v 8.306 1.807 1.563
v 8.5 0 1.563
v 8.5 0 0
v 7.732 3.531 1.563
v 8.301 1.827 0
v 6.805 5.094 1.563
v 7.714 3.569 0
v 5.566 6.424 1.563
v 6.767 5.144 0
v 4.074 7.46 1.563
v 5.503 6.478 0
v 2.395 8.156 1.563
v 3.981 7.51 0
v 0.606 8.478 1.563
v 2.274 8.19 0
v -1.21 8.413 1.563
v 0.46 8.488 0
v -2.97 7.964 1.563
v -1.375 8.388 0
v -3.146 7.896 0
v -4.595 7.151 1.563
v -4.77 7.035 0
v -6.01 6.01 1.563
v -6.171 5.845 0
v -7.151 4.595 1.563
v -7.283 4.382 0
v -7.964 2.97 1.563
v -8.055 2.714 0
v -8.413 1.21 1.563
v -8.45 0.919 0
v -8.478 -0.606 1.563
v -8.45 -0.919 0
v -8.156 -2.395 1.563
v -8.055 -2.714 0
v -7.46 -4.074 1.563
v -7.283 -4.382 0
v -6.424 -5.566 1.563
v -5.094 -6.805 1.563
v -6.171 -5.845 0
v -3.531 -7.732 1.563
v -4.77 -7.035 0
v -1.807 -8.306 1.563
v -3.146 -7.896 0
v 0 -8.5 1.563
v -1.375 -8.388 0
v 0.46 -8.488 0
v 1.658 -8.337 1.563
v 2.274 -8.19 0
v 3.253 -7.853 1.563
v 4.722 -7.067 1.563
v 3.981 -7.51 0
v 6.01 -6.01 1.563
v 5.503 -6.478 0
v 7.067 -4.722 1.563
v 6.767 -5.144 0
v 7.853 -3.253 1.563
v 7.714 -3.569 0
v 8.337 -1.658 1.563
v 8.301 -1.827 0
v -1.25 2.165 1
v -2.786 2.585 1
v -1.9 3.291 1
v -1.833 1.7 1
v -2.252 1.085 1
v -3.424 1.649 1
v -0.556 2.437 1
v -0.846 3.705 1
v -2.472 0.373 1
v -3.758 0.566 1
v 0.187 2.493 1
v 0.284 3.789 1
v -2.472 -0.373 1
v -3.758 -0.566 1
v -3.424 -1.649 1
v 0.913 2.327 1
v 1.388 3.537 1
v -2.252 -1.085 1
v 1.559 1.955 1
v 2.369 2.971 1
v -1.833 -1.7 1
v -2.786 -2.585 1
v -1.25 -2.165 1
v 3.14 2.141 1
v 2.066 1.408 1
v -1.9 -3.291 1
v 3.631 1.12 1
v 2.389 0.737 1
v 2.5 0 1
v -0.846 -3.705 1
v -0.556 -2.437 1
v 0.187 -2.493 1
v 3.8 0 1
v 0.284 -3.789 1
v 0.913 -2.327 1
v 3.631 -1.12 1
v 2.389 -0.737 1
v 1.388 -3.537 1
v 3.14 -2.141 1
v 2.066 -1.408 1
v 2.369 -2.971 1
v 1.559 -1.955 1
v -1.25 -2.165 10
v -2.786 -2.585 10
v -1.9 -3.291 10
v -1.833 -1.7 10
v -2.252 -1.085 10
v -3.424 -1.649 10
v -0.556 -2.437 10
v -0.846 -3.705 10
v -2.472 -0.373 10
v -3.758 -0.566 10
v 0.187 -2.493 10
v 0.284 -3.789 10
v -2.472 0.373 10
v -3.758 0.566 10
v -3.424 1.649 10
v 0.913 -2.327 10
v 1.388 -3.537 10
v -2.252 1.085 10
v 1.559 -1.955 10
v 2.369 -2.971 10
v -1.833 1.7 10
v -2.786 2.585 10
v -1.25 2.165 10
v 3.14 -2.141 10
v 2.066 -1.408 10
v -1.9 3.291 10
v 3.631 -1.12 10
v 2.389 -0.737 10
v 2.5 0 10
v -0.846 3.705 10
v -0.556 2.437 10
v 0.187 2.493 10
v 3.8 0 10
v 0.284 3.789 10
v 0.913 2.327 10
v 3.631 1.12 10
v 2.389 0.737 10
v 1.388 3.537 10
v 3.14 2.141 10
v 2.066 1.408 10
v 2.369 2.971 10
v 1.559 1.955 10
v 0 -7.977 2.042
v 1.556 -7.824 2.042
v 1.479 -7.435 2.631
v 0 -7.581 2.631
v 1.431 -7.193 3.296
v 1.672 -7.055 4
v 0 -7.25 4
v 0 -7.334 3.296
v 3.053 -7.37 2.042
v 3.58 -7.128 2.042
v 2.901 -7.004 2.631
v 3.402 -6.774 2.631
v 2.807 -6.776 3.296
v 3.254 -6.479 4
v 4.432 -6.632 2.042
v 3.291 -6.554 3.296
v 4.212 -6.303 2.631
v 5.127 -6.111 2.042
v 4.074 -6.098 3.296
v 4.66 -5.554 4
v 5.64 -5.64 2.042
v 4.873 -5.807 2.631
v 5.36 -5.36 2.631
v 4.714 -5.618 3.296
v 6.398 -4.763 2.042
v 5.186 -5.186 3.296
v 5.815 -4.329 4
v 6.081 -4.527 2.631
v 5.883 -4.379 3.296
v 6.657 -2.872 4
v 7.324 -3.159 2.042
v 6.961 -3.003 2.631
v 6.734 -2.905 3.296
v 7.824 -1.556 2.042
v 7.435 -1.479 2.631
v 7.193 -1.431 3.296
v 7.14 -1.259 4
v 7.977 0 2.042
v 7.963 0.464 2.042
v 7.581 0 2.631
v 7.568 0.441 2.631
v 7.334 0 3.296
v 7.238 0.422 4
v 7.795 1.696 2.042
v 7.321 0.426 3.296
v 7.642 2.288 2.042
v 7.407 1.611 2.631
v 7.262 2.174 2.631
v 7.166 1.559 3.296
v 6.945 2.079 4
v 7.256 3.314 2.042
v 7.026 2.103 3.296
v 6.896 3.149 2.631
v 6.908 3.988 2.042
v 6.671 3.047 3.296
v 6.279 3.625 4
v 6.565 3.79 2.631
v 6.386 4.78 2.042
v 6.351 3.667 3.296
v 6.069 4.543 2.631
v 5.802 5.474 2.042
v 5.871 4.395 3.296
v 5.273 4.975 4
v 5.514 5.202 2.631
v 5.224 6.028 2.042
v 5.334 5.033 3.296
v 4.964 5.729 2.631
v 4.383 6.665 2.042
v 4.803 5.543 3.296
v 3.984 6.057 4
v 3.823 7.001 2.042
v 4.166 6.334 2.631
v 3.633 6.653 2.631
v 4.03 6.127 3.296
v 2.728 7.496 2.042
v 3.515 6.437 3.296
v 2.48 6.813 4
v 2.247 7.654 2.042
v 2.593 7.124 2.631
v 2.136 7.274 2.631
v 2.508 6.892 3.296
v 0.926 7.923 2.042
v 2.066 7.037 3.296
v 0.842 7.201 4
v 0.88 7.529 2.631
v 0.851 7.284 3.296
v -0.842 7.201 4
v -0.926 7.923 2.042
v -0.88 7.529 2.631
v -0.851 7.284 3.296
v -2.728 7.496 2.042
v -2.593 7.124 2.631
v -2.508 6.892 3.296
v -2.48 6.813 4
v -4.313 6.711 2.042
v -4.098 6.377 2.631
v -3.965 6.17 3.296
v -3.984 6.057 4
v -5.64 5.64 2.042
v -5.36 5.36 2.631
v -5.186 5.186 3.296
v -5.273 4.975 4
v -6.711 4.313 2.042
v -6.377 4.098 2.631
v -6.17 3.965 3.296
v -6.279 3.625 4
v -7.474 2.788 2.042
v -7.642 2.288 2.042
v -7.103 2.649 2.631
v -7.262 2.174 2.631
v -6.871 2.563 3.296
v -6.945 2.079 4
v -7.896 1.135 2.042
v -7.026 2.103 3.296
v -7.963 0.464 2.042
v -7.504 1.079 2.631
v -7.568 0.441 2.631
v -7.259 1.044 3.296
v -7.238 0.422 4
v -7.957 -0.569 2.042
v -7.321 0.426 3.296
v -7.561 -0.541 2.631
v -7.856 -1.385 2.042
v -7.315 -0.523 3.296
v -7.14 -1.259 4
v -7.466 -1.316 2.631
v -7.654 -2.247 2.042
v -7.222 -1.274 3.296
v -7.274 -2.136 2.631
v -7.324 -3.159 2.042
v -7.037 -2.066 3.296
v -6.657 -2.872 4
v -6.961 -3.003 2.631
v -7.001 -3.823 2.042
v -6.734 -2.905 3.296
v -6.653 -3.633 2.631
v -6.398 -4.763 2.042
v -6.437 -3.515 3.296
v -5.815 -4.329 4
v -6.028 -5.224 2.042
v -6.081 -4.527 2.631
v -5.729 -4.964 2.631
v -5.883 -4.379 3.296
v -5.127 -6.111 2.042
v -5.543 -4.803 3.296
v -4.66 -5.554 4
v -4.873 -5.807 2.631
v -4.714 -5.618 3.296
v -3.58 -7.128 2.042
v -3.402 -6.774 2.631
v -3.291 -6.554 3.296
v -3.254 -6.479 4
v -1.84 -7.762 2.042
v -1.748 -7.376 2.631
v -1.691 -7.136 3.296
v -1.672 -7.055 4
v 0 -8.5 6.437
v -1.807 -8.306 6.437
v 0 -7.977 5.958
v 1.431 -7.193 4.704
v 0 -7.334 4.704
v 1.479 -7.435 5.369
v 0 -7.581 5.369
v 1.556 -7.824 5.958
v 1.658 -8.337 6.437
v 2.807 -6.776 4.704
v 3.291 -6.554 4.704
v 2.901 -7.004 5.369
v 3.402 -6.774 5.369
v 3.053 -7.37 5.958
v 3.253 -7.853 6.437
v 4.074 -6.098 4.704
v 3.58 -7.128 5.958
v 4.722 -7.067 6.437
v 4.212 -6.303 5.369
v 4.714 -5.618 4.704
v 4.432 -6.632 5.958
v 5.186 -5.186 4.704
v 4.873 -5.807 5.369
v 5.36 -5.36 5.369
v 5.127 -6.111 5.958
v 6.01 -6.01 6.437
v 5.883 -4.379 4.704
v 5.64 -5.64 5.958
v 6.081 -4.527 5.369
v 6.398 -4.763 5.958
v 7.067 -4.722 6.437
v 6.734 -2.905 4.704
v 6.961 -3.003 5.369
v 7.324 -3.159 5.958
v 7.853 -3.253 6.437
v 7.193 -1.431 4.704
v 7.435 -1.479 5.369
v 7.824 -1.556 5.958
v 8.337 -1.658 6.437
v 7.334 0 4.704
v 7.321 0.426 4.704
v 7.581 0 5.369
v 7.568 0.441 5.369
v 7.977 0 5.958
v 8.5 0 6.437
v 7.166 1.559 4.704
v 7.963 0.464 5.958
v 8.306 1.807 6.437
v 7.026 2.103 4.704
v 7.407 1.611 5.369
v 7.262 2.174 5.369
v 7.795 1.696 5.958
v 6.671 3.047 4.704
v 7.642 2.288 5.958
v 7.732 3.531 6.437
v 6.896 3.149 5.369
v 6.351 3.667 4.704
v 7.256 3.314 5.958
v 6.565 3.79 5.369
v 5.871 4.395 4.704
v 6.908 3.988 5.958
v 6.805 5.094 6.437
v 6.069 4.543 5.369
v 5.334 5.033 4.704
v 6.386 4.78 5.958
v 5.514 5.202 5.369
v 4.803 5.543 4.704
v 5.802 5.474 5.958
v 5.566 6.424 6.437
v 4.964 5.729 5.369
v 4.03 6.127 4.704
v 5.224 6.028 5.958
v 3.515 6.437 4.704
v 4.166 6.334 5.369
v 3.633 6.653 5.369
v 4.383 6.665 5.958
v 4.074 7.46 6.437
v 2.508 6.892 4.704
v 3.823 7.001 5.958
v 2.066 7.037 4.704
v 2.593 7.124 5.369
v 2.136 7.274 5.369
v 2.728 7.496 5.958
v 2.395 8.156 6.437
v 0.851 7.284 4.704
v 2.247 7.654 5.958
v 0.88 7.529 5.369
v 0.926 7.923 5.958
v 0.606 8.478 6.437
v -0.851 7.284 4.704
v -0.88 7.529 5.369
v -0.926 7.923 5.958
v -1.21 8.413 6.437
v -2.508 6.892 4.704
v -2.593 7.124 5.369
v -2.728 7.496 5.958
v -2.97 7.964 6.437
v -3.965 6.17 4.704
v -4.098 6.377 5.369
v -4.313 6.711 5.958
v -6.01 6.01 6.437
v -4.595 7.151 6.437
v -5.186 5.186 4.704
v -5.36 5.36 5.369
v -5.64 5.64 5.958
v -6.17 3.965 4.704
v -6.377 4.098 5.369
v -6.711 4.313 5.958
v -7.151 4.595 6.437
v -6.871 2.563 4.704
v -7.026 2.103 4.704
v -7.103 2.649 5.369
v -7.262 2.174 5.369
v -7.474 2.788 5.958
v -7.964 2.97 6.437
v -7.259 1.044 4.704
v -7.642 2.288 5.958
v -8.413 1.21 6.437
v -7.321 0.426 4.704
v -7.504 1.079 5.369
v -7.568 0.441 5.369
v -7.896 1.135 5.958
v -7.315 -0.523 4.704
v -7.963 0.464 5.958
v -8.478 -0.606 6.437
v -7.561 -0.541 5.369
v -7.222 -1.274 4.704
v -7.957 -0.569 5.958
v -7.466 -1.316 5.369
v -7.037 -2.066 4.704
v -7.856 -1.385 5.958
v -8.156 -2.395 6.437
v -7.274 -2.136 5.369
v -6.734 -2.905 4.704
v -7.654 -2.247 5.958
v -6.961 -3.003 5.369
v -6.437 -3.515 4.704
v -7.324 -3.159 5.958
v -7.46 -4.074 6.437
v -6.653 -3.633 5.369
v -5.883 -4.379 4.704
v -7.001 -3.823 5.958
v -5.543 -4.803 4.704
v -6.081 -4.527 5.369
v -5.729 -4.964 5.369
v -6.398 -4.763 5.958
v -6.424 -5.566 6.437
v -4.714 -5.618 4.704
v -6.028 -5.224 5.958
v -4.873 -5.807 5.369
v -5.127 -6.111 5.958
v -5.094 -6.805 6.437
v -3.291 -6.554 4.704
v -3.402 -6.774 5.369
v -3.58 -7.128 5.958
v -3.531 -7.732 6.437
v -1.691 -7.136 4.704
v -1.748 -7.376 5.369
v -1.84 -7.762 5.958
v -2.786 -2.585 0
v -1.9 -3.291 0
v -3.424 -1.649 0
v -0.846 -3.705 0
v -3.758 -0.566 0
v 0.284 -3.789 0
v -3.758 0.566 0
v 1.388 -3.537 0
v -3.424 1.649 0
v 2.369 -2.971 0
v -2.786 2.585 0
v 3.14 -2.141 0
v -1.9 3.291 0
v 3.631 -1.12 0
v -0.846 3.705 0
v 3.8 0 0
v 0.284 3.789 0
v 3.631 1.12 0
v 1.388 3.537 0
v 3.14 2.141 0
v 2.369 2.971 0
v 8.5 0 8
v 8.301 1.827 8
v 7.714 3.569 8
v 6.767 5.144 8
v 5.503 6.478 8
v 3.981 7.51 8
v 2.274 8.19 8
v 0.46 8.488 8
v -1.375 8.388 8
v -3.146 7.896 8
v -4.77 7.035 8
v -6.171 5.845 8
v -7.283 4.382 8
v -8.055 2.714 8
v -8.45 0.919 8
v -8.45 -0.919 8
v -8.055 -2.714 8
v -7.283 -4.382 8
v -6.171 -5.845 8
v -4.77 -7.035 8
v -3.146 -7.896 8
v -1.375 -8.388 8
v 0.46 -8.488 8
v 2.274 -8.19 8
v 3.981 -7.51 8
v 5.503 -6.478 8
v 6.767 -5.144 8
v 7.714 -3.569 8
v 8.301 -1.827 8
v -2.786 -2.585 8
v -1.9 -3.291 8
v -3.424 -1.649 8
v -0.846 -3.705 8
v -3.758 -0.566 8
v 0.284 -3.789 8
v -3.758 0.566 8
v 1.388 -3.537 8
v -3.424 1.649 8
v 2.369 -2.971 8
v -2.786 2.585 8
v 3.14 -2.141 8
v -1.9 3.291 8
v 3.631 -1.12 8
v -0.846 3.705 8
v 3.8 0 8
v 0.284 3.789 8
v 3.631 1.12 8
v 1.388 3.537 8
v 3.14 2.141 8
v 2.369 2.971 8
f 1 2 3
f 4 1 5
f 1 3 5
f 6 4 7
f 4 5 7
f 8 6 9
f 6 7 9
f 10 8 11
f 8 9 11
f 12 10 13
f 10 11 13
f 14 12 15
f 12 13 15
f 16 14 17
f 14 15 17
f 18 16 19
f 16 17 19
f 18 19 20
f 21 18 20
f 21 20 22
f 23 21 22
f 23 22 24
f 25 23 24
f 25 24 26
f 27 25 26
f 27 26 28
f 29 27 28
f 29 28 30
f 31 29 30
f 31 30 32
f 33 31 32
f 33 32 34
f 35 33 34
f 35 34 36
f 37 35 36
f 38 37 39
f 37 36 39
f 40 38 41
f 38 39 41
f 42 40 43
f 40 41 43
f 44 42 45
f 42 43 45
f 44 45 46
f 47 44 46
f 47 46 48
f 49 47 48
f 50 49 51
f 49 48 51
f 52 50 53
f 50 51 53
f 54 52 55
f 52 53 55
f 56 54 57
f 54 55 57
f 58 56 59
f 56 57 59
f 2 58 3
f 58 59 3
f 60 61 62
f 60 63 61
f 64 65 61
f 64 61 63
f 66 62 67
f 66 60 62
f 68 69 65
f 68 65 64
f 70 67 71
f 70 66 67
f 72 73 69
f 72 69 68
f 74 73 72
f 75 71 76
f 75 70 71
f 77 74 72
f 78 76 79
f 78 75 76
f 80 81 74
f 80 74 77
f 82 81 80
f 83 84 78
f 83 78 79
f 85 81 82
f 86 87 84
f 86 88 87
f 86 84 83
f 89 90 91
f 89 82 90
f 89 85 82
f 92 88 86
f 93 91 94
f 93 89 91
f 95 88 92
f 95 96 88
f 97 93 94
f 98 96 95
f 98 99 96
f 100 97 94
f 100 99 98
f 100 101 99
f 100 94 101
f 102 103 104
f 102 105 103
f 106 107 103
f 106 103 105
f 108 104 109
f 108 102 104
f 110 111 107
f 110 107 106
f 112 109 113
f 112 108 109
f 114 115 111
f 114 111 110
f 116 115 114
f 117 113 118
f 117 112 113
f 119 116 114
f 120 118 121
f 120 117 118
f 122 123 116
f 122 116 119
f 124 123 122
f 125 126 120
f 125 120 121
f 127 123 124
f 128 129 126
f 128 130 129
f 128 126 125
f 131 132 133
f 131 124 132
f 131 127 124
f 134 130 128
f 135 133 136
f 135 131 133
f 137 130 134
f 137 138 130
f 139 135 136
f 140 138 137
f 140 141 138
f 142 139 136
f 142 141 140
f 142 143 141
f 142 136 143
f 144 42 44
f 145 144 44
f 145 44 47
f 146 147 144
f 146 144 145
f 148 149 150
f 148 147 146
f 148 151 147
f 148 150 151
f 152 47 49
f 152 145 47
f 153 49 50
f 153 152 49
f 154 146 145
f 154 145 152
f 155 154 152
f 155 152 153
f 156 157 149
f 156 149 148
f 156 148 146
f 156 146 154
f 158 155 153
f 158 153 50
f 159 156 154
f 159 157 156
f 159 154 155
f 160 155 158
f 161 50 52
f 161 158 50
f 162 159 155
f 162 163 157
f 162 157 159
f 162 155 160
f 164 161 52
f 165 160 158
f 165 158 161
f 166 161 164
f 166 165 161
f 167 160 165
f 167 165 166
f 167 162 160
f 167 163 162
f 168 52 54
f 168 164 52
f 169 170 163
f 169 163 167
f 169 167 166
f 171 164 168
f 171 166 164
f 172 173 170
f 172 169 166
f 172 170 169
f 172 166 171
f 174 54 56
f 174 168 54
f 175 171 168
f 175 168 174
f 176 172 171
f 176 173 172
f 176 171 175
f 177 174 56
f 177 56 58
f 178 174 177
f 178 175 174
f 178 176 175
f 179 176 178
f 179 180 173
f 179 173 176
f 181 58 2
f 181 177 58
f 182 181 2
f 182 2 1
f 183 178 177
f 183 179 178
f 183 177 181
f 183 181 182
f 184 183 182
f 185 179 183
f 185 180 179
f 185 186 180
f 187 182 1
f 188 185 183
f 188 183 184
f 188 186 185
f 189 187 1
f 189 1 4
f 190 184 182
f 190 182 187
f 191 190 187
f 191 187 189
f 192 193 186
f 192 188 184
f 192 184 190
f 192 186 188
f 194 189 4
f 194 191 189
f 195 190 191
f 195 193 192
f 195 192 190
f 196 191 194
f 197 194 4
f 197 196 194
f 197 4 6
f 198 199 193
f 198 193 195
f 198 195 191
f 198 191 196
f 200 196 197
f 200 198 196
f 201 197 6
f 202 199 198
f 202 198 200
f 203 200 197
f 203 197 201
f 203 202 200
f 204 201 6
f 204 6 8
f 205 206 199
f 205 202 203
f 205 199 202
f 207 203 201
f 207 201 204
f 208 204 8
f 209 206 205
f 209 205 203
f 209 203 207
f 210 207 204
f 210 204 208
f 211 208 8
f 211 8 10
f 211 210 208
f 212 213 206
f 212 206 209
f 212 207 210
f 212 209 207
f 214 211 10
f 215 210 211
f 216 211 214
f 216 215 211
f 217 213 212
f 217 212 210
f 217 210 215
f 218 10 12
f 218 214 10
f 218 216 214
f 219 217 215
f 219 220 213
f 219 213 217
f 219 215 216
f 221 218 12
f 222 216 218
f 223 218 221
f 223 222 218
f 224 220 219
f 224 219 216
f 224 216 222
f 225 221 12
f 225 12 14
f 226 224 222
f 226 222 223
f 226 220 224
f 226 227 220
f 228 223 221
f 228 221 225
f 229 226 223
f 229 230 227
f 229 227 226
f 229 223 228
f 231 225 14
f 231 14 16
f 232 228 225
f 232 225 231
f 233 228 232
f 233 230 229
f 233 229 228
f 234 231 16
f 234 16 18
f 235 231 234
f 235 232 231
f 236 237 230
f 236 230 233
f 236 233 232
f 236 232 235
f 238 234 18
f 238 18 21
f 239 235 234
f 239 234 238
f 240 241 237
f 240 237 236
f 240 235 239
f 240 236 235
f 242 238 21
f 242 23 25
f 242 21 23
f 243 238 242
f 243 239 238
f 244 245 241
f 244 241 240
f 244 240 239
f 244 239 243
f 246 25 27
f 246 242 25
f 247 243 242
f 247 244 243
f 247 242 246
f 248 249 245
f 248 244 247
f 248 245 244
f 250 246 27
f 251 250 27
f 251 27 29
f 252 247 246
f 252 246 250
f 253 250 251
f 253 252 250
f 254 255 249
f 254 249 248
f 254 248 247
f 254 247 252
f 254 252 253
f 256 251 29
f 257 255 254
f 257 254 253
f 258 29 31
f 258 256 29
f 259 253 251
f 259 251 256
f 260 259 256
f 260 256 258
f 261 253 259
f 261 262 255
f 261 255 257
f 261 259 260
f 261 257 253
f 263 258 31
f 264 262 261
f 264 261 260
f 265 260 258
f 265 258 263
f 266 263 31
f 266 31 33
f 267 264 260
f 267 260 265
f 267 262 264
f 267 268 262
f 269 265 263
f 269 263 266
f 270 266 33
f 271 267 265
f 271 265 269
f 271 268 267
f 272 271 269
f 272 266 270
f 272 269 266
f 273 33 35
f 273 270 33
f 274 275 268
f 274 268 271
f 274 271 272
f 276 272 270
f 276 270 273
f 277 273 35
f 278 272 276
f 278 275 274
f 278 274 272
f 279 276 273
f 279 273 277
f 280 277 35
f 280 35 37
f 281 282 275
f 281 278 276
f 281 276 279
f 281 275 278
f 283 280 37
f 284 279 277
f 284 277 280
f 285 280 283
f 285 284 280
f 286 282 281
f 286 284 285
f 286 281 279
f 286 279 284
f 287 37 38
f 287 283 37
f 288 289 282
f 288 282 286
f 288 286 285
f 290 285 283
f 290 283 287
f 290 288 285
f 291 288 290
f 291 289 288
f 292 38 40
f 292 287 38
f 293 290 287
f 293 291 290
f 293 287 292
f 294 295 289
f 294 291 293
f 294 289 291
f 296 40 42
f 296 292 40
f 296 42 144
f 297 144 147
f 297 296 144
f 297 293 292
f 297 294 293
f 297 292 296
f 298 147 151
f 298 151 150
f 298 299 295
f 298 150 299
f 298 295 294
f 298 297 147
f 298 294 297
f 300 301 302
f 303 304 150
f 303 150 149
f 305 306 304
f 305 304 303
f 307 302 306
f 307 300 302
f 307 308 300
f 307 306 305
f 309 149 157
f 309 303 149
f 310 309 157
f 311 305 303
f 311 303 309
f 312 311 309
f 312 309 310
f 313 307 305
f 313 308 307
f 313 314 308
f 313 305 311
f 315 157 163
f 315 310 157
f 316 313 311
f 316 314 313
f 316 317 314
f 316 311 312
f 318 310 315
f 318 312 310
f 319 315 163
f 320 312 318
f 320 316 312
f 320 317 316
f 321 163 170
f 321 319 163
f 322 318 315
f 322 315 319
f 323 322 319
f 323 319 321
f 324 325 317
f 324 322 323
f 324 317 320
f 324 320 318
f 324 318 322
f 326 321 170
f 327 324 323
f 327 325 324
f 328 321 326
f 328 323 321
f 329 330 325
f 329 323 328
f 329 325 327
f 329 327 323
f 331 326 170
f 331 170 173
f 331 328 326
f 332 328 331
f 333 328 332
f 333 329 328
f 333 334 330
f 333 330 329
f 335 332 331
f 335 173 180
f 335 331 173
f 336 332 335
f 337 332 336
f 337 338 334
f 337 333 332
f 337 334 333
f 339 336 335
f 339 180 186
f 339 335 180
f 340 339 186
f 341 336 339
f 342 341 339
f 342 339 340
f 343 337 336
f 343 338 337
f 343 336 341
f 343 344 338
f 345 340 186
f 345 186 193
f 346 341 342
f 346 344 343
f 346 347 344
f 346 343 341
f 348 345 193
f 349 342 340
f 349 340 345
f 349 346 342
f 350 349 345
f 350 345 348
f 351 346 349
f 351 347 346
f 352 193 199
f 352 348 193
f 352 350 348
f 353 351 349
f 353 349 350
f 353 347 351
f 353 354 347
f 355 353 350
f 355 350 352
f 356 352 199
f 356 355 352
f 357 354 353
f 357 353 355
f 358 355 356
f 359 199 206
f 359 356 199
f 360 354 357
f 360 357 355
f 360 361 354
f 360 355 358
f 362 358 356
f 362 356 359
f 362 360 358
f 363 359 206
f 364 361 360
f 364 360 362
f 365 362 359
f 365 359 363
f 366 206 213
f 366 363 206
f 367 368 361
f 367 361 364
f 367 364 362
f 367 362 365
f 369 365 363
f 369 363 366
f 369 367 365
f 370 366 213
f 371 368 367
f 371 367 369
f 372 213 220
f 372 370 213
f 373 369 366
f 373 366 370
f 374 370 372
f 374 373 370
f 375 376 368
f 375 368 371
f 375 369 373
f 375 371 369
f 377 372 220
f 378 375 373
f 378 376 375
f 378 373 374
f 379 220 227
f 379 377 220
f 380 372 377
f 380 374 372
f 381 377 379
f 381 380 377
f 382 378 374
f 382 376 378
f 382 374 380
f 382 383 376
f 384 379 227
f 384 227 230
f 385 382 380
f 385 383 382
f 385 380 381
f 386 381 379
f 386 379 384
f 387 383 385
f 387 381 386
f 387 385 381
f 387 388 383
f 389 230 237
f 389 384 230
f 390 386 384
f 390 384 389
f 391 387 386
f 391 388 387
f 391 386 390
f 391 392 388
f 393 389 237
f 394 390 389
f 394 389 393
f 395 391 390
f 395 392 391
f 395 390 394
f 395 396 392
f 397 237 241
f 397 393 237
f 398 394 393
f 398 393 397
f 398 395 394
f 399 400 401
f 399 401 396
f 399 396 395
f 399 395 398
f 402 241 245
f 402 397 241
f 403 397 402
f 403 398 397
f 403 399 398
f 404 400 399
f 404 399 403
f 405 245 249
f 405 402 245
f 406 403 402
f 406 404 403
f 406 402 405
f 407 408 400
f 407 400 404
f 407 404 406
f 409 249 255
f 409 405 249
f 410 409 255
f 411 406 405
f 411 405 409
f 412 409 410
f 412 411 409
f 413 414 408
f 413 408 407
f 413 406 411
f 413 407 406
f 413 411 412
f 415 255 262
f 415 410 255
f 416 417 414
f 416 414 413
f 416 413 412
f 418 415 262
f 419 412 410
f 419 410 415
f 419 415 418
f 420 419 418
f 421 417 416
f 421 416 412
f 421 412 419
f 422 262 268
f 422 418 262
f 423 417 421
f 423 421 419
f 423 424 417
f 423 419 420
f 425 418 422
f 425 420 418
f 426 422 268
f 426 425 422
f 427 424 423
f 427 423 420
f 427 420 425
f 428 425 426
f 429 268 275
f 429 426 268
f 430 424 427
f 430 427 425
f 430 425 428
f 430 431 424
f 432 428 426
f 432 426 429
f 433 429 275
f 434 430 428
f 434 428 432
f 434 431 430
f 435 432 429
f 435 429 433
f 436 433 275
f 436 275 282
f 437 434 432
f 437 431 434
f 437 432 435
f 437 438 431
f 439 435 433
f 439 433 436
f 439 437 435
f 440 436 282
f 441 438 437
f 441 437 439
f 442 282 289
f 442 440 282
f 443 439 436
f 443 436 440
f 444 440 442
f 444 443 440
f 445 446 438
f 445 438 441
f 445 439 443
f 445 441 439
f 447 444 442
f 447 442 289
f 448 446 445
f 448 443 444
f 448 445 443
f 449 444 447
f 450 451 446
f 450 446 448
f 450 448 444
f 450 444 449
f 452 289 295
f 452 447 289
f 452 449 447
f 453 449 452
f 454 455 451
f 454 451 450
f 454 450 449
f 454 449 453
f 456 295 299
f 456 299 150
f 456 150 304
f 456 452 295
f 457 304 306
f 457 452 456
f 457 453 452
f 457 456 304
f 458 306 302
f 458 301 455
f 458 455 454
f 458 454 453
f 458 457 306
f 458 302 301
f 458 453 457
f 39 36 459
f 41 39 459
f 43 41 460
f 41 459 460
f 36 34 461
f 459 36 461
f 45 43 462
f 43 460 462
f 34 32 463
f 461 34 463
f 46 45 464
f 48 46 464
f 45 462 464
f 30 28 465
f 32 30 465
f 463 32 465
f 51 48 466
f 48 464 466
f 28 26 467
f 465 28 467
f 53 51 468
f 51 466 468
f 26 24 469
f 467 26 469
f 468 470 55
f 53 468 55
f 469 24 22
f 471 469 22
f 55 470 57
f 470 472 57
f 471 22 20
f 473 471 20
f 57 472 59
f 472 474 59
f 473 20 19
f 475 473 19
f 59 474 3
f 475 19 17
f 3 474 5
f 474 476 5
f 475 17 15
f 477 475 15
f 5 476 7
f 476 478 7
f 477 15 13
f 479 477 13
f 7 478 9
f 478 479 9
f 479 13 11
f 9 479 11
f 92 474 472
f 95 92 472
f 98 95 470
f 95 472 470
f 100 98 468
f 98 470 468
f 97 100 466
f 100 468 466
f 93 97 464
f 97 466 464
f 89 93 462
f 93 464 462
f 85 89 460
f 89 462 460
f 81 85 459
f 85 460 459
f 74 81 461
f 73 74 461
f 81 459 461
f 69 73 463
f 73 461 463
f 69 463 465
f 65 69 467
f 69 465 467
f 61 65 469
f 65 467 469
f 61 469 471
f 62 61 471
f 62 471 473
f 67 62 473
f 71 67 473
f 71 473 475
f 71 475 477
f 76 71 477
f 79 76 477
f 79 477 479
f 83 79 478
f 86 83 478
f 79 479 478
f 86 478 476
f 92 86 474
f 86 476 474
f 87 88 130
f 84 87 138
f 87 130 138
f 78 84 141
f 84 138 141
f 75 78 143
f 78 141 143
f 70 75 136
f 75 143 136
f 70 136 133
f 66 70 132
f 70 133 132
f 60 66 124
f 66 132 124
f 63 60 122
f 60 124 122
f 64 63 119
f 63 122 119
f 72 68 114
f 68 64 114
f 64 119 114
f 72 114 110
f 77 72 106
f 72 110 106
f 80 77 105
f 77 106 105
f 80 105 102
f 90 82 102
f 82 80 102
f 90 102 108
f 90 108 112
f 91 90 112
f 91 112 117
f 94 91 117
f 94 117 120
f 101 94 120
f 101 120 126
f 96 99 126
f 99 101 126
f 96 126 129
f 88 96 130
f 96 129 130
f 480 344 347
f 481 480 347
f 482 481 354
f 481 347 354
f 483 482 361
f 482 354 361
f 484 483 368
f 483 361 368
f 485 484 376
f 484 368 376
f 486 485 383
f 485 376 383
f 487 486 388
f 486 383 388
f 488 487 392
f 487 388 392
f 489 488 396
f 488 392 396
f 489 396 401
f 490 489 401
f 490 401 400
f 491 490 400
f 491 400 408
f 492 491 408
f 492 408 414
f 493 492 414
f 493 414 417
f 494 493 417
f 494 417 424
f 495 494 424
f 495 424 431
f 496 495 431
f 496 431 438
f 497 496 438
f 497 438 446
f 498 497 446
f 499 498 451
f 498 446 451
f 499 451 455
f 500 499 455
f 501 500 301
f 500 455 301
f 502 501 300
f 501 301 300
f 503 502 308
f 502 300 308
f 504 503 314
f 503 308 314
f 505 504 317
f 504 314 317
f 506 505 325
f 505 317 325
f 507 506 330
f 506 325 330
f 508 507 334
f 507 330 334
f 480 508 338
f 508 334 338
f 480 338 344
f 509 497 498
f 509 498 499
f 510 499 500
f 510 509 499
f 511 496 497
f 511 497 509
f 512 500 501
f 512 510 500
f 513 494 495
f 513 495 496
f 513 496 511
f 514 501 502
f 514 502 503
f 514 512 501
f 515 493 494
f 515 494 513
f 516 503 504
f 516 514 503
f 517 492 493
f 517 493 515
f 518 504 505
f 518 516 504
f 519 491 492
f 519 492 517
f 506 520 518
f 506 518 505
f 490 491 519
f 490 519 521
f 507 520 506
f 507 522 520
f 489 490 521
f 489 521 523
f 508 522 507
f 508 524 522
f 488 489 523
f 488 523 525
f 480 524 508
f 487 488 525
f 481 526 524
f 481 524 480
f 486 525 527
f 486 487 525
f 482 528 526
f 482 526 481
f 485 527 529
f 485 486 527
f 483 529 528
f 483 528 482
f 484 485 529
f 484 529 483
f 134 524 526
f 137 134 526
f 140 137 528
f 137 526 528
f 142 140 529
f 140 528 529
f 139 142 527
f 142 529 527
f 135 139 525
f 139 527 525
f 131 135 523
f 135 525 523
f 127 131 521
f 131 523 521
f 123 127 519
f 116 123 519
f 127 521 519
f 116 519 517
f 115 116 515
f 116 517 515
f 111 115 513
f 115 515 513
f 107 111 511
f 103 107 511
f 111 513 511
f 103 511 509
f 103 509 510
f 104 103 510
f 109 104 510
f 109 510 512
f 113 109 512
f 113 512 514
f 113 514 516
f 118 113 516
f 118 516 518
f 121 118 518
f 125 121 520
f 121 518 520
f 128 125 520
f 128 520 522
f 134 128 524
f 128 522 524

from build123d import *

# Parameters (mm, degrees)
F0_R     = 8.5
F1_DEPTH = 8
F2_R     = 3.8
F3_DEPTH = 2
F4_R     = 2.5
F5_DEPTH = 10.001
F6_R     = 3
F8_R     = 3.8
F8_R_2   = 2.5
F9_DEPTH = 1


with BuildPart() as f1:
    # F0 (on Top) → F1 (new body)
    with BuildSketch(Plane.XY):
        Circle(F0_R)
    extrude(amount=F1_DEPTH)

    # F2 (on face) → F3 (join)
    with BuildSketch(Plane.XY.offset(8)):
        Circle(F2_R)
    extrude(amount=F3_DEPTH)

    # F4 (on face) → F5 (cut, through all)
    with BuildSketch(Plane.XY.offset(10)):
        Circle(F4_R)
    extrude(amount=-F5_DEPTH, mode=Mode.SUBTRACT)

    # F6 (on Right) → F7 (revolve, cut)
    with BuildSketch(Plane.YZ):
        with Locations((-10.25, 4)):
            Circle(F6_R)
    revolve(axis=Axis((0, 0, 7.899270393), (0, 0, 1)), mode=Mode.SUBTRACT)

    # F8 (on face) → F9 (cut)
    with BuildSketch(Plane(origin=(0, 0, 0), x_dir=(1, 0, 0), z_dir=(0, 0, -1))):
        Circle(F8_R)
        Circle(F8_R_2, mode=Mode.SUBTRACT)
    extrude(amount=-F9_DEPTH, mode=Mode.SUBTRACT)


solid = f1.part
